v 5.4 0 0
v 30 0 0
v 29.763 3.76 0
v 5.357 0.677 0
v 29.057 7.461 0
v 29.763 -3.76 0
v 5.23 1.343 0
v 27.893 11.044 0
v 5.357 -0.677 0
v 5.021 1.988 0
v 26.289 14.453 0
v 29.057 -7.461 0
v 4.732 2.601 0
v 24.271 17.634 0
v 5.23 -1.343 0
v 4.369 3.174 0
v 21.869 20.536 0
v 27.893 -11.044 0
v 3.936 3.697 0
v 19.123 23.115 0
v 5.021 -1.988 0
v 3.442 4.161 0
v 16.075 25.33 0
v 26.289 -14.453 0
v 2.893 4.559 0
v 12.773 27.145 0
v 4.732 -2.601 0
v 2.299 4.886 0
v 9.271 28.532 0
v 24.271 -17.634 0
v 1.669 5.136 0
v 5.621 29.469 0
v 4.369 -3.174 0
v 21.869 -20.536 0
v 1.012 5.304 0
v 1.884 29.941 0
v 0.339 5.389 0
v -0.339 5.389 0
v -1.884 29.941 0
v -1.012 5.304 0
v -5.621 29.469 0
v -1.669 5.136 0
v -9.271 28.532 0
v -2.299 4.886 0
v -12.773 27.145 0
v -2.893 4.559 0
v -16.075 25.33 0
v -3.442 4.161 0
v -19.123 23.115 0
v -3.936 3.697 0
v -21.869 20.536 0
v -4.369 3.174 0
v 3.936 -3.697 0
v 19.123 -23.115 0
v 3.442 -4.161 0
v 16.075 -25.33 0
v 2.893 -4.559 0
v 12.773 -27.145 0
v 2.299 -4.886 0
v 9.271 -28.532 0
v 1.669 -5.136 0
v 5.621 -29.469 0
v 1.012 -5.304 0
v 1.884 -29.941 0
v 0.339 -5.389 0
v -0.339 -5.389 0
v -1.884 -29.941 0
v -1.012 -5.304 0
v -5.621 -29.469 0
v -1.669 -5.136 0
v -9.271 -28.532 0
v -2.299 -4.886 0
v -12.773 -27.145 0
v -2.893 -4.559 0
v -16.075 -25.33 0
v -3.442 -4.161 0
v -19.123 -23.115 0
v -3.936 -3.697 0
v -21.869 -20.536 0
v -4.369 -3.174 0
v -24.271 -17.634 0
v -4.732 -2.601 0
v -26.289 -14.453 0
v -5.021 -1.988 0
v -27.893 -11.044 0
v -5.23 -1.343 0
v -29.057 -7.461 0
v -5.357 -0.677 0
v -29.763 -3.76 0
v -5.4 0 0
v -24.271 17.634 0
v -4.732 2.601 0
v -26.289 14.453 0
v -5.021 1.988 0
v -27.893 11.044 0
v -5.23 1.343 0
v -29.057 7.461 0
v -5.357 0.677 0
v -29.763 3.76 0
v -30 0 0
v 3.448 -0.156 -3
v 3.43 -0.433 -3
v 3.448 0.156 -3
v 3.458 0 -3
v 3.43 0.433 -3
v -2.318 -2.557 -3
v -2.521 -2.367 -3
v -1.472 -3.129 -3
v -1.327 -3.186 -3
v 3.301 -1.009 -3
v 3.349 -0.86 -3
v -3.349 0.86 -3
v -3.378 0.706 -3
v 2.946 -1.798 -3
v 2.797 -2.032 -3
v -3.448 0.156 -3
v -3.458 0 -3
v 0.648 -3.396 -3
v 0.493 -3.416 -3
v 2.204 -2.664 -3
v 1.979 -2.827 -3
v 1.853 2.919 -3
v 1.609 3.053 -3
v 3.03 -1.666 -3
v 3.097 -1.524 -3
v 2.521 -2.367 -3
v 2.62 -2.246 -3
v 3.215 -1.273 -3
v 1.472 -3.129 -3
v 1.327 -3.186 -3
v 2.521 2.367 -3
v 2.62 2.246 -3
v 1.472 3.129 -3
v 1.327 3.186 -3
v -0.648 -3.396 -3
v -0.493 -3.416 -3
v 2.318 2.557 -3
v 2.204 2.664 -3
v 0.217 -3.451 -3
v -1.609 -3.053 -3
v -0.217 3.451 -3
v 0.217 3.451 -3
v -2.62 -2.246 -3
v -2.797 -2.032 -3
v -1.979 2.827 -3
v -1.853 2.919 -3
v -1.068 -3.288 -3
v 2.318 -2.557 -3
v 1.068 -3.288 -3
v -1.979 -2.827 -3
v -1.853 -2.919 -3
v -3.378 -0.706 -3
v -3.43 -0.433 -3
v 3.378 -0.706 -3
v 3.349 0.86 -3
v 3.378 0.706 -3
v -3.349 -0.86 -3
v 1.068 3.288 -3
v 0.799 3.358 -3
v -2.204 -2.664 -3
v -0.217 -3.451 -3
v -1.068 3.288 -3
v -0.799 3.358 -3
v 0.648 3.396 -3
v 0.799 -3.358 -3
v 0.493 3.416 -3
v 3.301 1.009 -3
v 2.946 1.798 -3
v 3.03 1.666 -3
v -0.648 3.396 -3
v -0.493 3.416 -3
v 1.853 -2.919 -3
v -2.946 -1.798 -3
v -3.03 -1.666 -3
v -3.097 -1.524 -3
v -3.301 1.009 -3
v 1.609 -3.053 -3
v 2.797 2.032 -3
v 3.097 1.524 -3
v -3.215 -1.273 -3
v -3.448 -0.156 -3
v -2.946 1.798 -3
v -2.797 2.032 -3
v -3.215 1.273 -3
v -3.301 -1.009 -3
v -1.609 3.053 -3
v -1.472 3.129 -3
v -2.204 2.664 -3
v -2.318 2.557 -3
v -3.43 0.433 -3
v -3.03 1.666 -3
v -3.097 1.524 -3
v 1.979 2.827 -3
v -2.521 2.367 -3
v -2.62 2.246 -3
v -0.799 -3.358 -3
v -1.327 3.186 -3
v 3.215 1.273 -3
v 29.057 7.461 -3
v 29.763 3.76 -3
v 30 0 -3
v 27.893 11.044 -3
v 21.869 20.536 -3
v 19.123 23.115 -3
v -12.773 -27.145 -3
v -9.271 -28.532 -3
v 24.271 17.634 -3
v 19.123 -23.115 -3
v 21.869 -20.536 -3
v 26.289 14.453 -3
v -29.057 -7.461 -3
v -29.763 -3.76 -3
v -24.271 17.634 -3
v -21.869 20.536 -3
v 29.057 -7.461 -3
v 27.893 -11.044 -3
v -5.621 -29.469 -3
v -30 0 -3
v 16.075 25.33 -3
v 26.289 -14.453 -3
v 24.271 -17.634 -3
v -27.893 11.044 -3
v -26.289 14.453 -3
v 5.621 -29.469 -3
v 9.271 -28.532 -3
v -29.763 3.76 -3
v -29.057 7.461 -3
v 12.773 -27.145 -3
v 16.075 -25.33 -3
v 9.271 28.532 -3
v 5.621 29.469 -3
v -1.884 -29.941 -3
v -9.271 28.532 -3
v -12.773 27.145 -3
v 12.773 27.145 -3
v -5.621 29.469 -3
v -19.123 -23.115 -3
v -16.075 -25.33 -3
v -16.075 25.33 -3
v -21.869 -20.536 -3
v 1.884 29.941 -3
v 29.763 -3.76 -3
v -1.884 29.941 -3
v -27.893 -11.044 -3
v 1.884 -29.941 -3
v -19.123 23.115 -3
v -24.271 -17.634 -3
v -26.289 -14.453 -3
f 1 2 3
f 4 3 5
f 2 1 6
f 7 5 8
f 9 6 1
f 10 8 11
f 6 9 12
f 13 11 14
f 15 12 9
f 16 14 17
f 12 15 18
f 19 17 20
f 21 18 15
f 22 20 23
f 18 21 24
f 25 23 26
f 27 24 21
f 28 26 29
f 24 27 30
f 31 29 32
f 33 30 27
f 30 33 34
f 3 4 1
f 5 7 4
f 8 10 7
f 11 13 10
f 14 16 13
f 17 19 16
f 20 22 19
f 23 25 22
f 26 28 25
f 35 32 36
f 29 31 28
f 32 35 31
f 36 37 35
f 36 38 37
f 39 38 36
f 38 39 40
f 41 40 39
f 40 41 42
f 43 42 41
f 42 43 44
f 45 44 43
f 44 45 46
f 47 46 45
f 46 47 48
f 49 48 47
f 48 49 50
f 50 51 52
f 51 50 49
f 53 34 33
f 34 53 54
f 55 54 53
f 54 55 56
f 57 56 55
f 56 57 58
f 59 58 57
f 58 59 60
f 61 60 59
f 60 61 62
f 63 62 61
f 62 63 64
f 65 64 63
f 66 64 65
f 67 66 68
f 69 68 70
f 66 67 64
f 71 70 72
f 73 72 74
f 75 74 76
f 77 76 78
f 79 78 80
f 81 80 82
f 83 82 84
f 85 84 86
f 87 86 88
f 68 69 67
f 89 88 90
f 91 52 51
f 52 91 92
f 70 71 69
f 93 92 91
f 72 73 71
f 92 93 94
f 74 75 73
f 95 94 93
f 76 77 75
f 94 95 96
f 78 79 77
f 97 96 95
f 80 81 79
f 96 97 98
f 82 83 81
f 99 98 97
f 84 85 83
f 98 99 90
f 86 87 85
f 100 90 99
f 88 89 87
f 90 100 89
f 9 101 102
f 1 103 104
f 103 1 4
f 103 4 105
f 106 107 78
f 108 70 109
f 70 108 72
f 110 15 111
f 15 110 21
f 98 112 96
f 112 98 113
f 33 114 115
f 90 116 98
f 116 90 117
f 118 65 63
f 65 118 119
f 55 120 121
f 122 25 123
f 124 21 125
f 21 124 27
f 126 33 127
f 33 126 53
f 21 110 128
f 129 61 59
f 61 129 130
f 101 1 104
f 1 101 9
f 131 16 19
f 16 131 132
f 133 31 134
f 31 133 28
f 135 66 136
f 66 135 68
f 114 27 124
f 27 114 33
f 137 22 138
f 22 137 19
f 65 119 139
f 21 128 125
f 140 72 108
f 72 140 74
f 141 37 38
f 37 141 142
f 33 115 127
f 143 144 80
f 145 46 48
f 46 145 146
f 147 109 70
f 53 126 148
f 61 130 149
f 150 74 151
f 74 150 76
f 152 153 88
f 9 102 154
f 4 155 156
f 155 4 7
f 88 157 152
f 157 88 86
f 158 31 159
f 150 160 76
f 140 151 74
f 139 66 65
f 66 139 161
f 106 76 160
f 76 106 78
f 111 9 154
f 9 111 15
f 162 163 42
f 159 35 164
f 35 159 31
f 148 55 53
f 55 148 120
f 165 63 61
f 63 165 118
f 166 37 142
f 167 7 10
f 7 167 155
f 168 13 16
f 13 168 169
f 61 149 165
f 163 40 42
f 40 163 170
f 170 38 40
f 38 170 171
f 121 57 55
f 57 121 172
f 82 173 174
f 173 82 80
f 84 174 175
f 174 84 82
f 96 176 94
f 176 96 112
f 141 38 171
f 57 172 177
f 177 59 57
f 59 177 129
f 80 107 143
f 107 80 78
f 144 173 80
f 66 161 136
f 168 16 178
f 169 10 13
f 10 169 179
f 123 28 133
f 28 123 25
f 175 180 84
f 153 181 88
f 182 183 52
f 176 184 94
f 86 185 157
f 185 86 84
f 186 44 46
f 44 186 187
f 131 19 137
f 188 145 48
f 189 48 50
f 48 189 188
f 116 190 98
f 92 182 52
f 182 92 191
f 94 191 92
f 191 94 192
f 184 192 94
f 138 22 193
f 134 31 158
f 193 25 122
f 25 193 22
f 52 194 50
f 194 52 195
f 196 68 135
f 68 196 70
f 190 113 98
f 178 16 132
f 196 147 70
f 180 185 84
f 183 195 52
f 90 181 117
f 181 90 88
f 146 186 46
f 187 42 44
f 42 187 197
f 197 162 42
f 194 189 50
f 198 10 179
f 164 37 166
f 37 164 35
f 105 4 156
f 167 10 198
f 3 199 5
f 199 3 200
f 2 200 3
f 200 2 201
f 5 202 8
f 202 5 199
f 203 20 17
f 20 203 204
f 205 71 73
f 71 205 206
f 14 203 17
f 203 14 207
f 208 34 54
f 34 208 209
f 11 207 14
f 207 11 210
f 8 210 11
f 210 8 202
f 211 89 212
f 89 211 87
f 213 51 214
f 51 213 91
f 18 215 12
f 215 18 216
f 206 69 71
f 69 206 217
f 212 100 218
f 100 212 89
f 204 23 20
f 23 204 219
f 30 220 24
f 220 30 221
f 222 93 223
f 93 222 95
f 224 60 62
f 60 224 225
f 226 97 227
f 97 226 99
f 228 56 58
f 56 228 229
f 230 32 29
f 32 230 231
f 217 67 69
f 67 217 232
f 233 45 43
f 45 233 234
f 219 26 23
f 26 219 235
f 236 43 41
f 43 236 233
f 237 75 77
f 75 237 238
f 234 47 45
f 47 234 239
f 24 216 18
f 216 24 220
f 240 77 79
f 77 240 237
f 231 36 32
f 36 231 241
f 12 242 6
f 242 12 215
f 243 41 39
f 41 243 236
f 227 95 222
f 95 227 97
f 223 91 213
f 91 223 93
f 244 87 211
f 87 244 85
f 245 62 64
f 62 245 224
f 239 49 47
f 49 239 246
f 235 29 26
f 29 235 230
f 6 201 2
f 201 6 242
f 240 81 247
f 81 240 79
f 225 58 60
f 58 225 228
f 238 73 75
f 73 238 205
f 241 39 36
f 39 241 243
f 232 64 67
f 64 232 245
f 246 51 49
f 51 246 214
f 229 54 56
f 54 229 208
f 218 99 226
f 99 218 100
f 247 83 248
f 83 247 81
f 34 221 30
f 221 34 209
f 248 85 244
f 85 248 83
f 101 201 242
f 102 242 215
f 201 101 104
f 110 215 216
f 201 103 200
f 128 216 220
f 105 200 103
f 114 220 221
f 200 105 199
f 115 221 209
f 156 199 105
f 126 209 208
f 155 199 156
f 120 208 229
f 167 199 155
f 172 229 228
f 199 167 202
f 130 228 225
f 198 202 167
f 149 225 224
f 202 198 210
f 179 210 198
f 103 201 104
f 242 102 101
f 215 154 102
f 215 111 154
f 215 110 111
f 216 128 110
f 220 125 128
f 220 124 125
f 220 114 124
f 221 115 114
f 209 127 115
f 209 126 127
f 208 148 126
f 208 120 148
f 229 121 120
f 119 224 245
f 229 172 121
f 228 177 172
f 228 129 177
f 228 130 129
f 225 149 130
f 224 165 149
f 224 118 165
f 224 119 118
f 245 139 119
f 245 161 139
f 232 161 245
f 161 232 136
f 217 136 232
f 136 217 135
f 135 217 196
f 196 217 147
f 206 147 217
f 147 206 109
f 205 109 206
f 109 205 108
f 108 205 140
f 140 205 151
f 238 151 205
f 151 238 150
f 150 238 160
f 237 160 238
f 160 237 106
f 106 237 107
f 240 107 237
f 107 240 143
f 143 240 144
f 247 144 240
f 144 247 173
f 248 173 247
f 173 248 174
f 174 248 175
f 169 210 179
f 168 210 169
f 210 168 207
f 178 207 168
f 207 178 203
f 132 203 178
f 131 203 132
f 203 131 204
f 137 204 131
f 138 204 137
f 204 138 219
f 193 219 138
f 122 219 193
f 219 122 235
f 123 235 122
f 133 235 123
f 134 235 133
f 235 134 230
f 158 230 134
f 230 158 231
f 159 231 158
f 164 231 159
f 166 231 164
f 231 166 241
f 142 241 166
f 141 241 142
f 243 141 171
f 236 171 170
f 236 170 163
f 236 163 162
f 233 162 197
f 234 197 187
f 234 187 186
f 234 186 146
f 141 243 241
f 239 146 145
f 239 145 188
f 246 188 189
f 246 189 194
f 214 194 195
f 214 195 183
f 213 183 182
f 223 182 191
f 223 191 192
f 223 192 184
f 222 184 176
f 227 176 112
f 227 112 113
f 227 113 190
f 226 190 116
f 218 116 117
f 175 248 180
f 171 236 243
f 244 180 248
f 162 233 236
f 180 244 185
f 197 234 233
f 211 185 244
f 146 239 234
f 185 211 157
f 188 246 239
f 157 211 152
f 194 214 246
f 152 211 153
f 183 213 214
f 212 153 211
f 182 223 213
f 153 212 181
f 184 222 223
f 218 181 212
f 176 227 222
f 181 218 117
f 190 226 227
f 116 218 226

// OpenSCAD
$fn = 50;


difference() {
	union() {
		translate(v = [0, 0, -3.0000000000]) {
			cylinder(h = 3, r = 30.0000000000);
		}
	}
	union() {
		translate(v = [0, 0, 0]) {
			rotate(a = [0, 0, 0]) {
				difference() {
					union() {
						translate(v = [0, 0, -3.0000000000]) {
							cylinder(h = 3, r = 2.6000000000);
						}
						translate(v = [0, 0, -3.9000000000]) {
							cylinder(h = 3.9000000000, r1 = 2.8750000000, r2 = 5.4000000000);
						}
						translate(v = [0, 0, -3.0000000000]) {
							cylinder(h = 3, r = 2.8750000000);
						}
						translate(v = [0, 0, -3.0000000000]) {
							cylinder(h = 3, r = 2.6000000000);
						}
					}
					union();
				}
			}
		}
	}
}
